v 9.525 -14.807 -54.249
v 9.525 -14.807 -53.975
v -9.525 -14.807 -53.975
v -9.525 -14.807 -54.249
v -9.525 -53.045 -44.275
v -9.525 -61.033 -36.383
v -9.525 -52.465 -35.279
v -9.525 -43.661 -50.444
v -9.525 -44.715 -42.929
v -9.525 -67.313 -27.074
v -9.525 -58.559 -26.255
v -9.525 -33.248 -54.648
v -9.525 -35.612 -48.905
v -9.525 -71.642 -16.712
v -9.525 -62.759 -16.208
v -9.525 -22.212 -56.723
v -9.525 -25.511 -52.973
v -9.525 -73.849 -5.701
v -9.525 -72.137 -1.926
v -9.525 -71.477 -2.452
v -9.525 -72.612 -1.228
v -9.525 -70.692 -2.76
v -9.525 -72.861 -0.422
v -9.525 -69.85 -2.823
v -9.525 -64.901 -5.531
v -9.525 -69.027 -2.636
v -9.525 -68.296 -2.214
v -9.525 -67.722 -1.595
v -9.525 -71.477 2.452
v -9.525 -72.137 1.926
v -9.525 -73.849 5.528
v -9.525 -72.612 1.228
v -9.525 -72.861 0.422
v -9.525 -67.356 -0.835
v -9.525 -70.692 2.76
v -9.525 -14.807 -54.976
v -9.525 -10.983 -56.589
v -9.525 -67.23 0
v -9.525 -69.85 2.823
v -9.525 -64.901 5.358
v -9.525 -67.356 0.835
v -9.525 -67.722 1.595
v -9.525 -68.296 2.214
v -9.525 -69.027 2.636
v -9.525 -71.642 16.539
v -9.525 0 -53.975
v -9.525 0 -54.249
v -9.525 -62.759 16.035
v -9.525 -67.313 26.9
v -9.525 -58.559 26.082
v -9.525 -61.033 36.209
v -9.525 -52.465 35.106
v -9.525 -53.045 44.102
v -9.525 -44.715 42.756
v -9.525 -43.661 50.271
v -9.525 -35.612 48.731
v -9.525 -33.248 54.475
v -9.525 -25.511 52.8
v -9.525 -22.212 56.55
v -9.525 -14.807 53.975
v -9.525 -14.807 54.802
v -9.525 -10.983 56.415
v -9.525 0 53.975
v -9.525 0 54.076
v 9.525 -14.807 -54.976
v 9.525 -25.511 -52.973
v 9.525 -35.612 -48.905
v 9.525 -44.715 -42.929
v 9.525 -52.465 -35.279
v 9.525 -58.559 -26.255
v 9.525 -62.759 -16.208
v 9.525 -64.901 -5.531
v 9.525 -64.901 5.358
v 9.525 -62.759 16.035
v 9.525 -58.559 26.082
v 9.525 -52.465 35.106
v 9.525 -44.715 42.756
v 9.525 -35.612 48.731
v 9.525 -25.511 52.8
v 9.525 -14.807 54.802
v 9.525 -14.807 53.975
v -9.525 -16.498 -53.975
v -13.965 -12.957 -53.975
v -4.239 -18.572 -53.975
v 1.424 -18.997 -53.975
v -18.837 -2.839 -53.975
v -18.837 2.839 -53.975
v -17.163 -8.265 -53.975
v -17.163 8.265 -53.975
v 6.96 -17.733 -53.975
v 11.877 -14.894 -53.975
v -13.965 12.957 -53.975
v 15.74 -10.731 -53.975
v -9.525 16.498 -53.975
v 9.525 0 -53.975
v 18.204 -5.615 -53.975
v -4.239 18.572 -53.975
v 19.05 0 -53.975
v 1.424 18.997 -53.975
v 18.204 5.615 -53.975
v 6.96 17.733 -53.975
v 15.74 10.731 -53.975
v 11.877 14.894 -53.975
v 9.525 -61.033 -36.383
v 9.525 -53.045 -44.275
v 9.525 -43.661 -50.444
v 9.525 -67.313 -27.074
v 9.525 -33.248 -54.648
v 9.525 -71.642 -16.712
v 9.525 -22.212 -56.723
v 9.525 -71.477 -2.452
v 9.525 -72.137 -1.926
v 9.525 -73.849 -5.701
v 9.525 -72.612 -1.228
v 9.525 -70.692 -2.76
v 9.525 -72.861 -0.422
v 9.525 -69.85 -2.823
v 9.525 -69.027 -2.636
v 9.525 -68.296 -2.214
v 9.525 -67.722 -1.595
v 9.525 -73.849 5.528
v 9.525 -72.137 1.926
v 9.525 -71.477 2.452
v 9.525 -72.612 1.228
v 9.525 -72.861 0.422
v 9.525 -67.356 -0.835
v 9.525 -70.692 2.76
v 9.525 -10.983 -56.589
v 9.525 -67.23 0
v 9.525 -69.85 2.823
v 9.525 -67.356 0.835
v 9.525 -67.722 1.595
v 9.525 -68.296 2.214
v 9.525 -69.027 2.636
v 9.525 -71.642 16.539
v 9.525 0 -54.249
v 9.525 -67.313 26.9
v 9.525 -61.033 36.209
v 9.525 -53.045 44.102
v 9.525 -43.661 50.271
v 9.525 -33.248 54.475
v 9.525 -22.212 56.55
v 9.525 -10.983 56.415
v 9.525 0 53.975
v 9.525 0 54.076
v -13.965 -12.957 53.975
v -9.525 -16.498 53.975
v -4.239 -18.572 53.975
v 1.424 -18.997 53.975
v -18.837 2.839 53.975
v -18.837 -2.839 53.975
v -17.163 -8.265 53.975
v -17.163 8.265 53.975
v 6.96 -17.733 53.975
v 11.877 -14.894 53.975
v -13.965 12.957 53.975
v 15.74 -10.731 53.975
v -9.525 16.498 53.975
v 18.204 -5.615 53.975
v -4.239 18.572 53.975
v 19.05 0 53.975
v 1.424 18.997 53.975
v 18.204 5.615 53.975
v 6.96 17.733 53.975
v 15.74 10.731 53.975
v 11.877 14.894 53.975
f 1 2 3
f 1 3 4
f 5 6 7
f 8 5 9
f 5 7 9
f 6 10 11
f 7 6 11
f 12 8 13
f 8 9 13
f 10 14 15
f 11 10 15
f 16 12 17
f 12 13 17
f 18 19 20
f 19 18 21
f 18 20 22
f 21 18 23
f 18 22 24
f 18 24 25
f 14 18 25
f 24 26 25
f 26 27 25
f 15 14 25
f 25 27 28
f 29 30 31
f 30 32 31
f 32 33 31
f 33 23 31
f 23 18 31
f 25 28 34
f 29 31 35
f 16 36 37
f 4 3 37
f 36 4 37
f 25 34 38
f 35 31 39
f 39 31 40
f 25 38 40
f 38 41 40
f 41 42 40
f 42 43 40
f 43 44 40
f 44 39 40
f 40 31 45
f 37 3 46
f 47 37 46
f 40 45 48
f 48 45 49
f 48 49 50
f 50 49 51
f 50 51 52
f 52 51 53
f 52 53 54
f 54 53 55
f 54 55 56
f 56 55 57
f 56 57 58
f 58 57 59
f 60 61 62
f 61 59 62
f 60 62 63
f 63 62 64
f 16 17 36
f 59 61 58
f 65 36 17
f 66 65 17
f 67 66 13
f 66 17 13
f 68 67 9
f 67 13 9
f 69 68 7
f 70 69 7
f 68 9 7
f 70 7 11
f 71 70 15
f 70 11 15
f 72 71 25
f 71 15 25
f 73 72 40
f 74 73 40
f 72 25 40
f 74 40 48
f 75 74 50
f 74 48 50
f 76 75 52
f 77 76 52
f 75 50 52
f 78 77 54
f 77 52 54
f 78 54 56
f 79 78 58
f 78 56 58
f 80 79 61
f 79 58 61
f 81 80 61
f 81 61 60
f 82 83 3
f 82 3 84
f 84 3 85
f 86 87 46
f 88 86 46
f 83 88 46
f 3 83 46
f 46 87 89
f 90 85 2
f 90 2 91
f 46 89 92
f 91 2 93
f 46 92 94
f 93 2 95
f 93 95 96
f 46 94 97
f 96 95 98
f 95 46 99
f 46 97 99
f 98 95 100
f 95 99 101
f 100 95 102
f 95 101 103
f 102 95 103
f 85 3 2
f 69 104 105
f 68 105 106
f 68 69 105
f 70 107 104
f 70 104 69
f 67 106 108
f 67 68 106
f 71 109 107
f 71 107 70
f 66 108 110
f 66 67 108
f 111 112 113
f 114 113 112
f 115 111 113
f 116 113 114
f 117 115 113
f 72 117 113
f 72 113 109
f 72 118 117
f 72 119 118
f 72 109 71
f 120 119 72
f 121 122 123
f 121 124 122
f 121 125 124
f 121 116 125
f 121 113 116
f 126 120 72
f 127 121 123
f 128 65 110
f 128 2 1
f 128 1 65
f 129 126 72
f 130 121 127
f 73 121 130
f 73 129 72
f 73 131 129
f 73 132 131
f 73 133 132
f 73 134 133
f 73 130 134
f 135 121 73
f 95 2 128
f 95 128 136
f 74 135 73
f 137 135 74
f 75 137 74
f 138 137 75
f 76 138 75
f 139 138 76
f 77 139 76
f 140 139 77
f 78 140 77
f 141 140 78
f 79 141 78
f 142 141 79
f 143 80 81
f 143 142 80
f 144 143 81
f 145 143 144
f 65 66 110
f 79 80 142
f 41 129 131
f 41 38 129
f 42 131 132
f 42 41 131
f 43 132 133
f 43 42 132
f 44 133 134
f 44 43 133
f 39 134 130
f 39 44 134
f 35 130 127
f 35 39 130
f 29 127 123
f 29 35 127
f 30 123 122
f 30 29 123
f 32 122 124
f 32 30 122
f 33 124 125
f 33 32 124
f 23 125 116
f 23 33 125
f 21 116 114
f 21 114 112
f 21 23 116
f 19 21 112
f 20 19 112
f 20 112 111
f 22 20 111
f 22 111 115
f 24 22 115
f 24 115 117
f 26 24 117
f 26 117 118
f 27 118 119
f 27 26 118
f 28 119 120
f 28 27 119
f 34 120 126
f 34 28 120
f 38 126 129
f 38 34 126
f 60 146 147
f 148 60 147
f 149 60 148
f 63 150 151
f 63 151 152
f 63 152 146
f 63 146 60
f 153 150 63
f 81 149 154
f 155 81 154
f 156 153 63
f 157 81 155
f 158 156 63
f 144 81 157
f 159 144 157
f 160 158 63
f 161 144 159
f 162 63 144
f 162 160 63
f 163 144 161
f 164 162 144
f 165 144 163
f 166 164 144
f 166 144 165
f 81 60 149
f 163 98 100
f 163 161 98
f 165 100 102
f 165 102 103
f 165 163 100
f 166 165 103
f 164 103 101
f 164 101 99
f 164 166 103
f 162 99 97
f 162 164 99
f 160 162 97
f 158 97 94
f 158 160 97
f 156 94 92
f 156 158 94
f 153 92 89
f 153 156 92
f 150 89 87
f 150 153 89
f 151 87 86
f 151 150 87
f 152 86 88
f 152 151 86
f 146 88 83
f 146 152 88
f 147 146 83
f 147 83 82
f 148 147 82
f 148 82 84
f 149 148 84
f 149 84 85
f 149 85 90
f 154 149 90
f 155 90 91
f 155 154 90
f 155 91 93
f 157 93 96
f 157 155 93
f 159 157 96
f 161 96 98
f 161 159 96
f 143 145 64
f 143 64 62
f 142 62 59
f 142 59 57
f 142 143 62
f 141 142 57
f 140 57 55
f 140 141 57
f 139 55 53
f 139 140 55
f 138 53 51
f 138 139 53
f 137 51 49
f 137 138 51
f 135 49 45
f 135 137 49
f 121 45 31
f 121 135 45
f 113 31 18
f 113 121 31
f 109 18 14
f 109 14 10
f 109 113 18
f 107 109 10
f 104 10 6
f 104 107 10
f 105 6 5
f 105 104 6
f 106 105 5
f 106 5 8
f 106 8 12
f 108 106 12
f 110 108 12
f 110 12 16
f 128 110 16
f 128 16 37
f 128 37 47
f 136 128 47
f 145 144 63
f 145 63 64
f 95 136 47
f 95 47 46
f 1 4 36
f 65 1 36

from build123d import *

# Parameters (mm, degrees)
F0_R     = 19.05
F1_DEPTH = 53.975
F2_R     = 2.831223
F3_DEPTH = 9.525


with BuildPart() as f1:
    # F0 (on Top) → F1 (new body, symmetric)
    with BuildSketch(Plane.XY):
        Circle(F0_R)
    extrude(amount=F1_DEPTH, both=True)

    # F2 (on Right) → F3 (join, symmetric)
    with BuildSketch(Plane.YZ):
        with BuildLine():
            Line((0, -54.249428), (0, 54.076027))
            ThreePointArc((0, 54.076027), (-74.126923, -0.086701), (0, -54.249428))
        make_face()
        with Locations((-70.061542, 0)):
            Circle(F2_R, mode=Mode.SUBTRACT)
        with BuildLine():
            ThreePointArc((-14.80739, -54.97568), (-65.170353, -0.086549), (-14.807088, 54.802305))
            Line((-14.807088, 54.802305), (-14.807088, 54.076027))
            Line((-14.807088, 54.076027), (-14.807088, -54.249428))
            Line((-14.807088, -54.249428), (-14.80739, -54.97568))
        make_face(mode=Mode.SUBTRACT)
    extrude(amount=F3_DEPTH, both=True)


solid = f1.part
